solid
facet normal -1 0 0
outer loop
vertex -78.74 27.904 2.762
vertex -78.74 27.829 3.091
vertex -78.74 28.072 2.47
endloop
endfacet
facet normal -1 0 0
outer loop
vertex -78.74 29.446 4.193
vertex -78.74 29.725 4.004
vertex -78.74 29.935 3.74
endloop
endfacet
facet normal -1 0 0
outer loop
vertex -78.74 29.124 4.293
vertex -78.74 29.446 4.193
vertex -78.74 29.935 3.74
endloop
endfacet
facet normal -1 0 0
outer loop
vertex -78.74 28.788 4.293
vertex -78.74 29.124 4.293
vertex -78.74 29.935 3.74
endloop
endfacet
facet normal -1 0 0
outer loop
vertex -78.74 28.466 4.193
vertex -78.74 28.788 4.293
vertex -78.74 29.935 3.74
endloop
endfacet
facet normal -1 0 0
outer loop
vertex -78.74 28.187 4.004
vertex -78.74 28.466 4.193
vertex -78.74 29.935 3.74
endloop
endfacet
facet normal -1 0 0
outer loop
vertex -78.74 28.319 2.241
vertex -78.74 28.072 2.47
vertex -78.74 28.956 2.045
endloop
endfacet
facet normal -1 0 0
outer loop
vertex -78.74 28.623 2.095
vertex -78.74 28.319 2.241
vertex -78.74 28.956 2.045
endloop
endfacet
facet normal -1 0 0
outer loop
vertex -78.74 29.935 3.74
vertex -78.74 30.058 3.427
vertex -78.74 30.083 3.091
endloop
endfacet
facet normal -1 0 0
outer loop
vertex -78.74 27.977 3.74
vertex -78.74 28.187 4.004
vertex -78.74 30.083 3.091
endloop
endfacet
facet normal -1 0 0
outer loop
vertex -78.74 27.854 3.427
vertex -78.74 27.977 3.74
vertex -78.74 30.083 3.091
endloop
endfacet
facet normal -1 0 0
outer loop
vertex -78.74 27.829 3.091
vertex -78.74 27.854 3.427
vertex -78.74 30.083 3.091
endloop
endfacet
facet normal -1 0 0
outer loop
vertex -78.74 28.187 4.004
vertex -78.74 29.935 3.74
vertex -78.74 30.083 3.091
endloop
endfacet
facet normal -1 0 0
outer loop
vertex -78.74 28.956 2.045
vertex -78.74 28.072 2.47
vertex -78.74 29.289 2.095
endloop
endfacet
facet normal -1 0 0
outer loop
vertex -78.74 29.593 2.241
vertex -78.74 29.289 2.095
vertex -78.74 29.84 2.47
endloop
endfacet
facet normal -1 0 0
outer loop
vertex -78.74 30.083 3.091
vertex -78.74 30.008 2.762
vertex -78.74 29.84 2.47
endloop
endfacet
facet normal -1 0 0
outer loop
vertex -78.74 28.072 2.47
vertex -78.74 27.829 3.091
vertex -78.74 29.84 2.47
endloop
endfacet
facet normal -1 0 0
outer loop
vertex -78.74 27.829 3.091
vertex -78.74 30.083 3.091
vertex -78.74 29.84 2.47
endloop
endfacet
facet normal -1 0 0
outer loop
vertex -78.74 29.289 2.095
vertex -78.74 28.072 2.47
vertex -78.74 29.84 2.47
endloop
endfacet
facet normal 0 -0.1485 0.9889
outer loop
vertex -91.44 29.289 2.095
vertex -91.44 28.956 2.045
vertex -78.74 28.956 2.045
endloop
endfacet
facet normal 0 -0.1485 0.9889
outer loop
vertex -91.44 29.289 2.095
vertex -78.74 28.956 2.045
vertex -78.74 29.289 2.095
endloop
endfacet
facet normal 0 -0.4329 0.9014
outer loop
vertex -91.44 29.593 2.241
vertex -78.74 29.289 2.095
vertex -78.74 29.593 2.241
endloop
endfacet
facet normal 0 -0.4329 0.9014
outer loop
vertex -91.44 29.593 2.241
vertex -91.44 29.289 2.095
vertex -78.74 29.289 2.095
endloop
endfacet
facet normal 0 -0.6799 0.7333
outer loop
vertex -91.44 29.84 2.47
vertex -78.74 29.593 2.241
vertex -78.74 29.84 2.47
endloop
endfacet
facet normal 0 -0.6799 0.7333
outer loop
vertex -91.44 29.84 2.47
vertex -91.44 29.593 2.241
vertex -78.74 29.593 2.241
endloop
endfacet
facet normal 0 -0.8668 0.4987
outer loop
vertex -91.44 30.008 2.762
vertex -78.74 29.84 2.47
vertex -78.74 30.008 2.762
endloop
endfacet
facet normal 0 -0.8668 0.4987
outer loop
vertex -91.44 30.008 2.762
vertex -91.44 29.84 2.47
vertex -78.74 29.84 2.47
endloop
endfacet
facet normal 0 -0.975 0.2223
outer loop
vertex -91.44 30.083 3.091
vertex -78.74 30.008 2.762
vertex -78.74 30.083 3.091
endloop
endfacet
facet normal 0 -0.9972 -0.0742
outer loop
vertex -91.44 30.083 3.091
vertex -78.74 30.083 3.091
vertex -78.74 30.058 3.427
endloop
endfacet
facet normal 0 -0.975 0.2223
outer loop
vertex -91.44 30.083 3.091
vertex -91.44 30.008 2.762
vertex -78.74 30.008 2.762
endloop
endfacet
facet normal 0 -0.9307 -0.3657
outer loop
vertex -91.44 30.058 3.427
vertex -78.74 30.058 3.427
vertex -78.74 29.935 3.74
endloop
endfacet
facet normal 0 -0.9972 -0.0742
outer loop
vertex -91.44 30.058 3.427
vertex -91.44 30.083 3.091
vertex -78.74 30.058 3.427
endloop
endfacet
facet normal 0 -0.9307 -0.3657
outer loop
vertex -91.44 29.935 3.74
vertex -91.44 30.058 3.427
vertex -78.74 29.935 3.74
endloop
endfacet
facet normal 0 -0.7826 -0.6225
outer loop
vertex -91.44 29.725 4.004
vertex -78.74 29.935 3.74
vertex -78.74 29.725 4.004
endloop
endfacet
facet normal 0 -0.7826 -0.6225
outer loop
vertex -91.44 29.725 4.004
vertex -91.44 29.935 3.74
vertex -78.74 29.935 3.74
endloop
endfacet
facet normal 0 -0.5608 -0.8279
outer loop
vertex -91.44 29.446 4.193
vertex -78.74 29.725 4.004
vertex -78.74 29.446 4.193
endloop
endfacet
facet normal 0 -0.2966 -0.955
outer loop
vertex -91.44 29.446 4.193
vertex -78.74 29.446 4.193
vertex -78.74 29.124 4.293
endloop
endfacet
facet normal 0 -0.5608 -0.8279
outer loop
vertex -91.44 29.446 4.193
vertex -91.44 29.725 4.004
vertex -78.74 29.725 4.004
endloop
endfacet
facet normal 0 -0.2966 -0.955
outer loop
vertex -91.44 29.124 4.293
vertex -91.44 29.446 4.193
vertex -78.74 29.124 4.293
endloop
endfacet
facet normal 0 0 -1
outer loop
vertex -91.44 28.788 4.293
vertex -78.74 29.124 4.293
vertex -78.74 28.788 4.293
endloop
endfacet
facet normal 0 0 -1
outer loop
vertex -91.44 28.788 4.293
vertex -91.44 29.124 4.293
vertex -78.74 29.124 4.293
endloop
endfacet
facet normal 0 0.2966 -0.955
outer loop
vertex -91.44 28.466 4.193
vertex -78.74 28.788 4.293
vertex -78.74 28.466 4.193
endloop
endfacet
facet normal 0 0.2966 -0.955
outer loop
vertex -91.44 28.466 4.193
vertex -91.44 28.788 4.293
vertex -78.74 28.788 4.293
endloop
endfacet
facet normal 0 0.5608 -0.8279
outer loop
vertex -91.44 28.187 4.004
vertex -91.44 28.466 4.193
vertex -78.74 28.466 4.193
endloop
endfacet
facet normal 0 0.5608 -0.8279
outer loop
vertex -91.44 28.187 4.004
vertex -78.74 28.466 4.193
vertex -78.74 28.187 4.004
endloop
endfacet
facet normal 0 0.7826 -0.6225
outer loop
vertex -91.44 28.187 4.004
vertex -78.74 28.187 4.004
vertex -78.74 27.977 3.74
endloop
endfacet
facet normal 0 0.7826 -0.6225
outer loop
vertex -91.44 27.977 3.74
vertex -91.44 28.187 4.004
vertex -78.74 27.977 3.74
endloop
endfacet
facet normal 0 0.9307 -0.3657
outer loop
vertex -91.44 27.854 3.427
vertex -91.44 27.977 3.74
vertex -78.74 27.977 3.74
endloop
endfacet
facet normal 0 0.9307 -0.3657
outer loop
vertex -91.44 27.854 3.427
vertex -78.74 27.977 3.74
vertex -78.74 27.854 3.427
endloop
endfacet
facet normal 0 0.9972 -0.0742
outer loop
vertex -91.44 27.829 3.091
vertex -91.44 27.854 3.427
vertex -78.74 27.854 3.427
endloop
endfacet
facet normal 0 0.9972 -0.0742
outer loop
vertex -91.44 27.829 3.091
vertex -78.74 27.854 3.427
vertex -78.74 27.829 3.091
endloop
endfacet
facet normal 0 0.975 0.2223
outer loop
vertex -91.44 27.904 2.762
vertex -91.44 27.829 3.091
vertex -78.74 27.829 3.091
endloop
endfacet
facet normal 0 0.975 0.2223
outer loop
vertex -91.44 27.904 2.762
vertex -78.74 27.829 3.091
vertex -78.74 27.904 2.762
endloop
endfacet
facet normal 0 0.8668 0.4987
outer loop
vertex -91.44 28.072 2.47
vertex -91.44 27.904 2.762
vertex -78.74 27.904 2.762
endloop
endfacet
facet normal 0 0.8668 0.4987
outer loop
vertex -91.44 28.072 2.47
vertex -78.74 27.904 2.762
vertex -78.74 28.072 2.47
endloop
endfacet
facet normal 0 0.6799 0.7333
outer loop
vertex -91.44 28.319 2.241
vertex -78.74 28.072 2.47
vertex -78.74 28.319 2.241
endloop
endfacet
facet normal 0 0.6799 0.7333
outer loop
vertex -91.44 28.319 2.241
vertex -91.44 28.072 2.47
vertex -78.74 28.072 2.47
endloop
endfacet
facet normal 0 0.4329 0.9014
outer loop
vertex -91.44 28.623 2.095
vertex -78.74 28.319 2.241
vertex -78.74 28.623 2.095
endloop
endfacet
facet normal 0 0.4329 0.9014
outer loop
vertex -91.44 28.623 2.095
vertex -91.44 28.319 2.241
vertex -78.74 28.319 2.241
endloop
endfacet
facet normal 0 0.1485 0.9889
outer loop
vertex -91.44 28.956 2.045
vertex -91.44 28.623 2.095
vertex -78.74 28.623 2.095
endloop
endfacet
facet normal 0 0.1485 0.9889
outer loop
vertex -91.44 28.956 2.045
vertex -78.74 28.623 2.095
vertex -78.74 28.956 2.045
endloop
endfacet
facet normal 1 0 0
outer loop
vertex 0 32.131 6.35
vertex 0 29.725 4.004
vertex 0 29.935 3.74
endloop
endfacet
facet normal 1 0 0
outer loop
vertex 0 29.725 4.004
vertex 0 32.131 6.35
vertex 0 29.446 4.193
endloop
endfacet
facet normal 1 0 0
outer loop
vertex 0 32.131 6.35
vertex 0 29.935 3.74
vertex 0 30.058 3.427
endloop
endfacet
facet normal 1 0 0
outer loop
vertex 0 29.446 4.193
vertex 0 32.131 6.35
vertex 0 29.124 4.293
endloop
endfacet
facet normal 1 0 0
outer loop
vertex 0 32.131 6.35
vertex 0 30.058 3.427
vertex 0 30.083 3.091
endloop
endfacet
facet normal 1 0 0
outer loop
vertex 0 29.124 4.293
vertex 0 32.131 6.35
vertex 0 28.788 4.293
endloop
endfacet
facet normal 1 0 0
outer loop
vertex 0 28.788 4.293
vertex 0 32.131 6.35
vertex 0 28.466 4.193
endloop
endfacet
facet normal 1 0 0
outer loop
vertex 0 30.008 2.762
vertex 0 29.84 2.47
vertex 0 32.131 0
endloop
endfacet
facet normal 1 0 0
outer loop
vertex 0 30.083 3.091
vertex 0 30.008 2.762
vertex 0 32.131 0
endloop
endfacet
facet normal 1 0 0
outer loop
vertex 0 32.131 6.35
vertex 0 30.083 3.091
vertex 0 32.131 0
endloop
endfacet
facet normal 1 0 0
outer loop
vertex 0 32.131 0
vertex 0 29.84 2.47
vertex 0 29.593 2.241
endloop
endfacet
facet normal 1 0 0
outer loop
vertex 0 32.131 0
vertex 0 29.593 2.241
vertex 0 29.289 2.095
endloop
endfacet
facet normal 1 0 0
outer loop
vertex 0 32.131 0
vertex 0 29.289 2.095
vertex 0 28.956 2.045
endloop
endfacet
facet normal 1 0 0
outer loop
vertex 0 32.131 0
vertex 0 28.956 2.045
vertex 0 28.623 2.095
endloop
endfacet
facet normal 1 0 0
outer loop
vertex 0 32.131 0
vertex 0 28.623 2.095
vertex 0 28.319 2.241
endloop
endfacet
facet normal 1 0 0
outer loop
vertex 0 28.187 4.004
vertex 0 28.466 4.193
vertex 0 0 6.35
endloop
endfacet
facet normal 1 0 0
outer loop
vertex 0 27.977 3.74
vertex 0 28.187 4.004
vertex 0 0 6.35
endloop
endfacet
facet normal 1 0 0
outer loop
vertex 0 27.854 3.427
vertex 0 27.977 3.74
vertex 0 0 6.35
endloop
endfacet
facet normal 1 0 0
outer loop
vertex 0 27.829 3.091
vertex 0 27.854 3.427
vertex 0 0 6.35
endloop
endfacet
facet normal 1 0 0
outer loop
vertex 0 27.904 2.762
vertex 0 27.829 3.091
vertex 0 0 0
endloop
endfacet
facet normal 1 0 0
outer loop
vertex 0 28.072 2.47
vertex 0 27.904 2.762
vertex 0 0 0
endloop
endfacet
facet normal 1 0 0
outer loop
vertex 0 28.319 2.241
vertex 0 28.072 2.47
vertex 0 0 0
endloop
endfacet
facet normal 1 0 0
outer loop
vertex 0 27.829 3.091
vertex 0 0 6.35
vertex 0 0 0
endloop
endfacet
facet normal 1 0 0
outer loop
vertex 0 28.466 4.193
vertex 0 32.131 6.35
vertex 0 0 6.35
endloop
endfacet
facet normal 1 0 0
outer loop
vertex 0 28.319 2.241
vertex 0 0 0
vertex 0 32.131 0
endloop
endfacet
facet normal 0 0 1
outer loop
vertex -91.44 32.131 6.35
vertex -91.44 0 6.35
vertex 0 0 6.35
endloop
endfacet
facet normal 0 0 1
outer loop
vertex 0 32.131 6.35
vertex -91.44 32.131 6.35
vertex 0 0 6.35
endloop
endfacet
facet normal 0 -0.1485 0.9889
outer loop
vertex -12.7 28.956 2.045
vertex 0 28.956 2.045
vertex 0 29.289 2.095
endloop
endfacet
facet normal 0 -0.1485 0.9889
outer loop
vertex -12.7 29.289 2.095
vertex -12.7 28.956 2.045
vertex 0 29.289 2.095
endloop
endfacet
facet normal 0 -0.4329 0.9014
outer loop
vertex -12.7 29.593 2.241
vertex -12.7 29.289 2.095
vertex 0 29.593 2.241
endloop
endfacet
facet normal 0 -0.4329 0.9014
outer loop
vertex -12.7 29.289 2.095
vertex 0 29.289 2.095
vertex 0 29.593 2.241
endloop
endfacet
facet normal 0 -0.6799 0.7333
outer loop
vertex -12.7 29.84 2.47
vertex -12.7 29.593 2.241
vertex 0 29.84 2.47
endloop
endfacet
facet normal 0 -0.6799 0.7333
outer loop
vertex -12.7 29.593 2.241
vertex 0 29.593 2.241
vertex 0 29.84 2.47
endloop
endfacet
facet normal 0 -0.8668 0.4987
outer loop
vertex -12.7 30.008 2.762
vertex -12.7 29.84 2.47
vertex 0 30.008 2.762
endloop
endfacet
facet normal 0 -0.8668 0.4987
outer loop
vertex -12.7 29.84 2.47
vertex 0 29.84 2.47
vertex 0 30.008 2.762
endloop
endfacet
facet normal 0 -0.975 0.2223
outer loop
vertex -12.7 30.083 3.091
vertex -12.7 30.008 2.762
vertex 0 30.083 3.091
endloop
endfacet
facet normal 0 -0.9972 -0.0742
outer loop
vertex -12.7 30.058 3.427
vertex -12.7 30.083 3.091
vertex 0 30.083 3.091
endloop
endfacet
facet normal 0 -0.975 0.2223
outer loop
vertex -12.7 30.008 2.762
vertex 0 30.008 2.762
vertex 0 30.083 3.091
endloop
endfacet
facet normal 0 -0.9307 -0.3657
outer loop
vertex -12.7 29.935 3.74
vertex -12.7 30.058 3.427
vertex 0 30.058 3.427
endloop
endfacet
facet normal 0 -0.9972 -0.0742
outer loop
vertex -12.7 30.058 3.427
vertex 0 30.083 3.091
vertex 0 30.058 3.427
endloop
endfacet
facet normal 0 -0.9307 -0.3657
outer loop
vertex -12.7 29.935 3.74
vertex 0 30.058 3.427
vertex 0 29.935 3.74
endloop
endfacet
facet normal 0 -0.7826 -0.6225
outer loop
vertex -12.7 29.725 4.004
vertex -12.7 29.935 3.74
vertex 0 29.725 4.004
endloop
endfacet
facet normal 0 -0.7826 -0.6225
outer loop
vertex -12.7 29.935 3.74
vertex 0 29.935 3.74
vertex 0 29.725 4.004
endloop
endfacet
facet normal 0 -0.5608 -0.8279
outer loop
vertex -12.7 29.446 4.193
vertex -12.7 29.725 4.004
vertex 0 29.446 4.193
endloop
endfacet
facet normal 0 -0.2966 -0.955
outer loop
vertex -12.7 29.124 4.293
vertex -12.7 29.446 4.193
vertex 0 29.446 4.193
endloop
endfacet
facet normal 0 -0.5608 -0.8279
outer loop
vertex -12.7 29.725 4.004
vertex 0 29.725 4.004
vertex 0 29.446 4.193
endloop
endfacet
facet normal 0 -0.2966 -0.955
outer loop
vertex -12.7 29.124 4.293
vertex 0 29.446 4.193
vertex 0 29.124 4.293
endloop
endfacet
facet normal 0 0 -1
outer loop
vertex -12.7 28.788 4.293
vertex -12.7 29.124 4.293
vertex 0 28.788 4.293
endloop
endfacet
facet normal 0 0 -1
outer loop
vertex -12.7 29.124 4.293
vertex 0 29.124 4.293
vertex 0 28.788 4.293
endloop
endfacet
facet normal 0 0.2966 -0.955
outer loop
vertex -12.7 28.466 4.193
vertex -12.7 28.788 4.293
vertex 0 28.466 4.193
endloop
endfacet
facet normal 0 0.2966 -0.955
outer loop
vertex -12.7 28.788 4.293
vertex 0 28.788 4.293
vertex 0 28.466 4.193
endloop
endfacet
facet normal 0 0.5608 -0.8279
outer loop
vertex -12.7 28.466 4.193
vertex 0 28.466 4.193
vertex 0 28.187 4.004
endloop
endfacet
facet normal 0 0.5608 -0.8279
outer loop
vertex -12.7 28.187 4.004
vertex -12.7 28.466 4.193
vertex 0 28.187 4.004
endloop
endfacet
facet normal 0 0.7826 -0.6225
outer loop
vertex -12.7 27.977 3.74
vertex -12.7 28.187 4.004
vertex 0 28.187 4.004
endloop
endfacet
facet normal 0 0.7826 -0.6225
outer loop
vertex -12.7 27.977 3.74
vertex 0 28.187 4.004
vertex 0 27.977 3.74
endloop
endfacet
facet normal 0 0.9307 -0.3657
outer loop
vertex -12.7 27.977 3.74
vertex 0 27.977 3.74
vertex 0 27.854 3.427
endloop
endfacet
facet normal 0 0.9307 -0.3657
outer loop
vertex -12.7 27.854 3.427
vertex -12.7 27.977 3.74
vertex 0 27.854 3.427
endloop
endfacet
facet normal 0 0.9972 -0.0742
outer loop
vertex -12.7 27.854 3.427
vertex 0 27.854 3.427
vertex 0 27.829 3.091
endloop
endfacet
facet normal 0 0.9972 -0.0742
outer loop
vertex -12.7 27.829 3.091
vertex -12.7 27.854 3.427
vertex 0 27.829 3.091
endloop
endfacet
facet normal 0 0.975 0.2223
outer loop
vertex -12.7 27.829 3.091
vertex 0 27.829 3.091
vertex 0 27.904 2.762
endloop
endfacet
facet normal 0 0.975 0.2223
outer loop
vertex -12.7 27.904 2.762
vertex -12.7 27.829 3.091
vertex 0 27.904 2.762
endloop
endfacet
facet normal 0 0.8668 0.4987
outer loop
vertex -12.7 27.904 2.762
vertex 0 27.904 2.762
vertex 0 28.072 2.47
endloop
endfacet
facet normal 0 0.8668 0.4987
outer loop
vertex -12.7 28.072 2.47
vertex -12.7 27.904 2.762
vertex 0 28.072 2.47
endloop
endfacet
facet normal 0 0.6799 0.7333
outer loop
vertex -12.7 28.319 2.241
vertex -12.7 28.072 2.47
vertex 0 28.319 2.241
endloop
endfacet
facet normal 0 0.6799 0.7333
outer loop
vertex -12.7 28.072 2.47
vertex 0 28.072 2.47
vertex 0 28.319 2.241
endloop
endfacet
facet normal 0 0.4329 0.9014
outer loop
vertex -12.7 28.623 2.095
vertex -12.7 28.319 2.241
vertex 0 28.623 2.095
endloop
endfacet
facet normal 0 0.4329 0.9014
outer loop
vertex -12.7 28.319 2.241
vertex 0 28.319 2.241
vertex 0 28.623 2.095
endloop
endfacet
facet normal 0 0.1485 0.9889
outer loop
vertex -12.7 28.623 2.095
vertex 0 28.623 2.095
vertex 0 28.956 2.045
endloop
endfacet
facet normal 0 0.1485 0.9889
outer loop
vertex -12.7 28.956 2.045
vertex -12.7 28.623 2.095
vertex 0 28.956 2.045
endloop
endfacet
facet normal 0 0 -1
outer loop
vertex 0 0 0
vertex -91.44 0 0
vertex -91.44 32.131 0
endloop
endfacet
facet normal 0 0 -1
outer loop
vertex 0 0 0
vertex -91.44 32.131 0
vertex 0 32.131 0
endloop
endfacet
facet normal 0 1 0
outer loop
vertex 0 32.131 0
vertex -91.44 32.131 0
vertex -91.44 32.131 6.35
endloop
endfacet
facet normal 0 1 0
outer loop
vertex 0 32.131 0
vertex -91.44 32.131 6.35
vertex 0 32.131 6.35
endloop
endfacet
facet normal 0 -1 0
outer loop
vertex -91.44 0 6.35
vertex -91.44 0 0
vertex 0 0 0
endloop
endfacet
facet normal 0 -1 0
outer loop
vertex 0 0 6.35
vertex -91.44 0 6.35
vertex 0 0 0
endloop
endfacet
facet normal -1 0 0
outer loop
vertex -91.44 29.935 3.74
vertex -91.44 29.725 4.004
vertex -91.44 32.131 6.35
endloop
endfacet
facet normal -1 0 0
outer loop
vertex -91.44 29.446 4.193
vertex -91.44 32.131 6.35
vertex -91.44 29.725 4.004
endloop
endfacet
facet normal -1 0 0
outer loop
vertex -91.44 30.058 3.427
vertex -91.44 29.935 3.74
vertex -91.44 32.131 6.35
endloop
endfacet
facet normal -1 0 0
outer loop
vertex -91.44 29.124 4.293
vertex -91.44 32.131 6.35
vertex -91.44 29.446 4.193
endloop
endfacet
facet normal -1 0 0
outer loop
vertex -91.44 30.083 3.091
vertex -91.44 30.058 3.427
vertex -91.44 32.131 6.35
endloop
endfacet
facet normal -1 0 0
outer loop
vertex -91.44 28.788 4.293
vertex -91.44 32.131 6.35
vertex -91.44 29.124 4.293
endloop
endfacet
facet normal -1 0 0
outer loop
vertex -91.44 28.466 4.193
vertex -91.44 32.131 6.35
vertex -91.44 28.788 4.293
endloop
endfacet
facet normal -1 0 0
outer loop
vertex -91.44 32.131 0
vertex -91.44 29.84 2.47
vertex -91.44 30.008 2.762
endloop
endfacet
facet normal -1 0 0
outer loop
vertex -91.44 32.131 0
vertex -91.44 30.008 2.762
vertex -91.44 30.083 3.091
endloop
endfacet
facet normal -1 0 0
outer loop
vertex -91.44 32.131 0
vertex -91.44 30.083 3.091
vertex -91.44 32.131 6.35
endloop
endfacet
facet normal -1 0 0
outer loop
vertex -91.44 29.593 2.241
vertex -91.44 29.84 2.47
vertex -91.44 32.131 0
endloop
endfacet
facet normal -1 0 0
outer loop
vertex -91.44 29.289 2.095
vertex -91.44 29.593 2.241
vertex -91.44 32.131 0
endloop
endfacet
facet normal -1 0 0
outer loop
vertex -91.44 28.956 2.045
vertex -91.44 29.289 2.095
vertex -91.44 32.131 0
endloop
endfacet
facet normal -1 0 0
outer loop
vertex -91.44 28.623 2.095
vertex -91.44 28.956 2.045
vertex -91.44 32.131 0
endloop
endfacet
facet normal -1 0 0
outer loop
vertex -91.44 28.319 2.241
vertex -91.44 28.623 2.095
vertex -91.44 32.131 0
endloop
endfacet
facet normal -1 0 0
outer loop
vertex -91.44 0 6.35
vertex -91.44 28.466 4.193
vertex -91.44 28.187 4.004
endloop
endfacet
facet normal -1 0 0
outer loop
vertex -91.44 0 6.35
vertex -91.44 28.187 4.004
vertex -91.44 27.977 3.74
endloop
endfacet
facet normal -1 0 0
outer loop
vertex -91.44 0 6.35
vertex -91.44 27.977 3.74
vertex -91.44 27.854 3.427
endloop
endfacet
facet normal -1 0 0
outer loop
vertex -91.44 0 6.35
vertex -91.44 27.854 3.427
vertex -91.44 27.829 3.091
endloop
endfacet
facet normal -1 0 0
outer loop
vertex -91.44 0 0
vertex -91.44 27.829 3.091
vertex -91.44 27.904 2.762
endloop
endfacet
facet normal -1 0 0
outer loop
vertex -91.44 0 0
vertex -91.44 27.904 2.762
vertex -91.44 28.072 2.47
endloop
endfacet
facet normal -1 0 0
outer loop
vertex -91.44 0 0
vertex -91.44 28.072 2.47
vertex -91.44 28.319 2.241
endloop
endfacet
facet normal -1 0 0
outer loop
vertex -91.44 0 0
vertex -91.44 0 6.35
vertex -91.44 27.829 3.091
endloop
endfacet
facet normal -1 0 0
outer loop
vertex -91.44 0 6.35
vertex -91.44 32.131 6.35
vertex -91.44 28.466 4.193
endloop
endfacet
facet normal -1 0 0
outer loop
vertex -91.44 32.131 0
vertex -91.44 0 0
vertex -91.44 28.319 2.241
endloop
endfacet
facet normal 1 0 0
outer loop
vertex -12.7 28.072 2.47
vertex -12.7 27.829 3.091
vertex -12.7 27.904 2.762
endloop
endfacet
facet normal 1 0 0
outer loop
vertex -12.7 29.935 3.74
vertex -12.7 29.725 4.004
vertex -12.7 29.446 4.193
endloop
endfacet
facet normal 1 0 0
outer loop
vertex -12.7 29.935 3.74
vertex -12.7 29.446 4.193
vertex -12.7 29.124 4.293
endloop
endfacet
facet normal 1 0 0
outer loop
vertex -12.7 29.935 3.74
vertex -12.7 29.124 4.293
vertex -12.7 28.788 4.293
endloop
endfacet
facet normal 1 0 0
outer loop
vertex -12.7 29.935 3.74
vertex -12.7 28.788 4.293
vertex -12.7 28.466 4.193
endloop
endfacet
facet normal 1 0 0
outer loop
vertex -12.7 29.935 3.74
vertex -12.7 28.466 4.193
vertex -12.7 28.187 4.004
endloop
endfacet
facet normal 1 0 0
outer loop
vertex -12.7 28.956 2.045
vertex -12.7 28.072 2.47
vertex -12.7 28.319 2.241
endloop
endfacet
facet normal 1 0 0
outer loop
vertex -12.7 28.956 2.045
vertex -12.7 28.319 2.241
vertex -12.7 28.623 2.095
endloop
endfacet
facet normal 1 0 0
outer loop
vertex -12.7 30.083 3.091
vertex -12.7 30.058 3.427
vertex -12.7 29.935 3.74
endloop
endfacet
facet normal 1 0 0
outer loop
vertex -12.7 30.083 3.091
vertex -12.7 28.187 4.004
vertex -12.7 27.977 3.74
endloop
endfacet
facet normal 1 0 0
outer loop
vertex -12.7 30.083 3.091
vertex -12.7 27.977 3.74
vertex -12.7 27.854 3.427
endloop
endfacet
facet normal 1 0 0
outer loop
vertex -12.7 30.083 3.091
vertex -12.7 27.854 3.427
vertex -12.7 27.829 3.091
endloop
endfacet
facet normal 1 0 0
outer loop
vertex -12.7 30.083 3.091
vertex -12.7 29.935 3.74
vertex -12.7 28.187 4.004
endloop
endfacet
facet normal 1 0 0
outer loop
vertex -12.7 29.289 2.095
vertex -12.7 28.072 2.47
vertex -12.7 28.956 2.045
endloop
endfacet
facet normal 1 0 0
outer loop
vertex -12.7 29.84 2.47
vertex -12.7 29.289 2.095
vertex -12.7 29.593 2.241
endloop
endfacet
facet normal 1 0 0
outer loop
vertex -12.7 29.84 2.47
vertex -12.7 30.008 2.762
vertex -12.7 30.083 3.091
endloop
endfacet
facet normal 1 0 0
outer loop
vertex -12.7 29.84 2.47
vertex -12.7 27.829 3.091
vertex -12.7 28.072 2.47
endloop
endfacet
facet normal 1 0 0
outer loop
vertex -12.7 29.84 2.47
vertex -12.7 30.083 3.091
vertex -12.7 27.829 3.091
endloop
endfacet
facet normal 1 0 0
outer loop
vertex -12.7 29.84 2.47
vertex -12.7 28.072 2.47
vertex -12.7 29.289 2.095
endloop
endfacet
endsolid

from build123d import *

# Parameters (mm, degrees)
SKETCH1_W           = 91.44
SKETCH1_H           = 6.35
BOSS_EXTRUDE1_DEPTH = 32.131
SKETCH2_R           = 1.1303
CUT_EXTRUDE1_DEPTH  = 12.7


with BuildPart() as part:
    # Sketch1 → Boss-Extrude1 (new body)
    with BuildSketch(Plane(origin=(0, 0, 0), x_dir=(1, 0, 0), z_dir=(0, 1, 0))):
        with Locations((-45.72, -3.175)):
            Rectangle(SKETCH1_W, SKETCH1_H)
    extrude(amount=BOSS_EXTRUDE1_DEPTH)

    # Sketch2 → Cut-Extrude1 (cut)
    with BuildSketch(Plane(origin=(0, 0, 0), x_dir=(0, 0, -1), z_dir=(1, 0, 0))):
        with Locations((-3.175, 28.956)):
            Circle(SKETCH2_R)
    cut_extrude1 = extrude(amount=-CUT_EXTRUDE1_DEPTH, mode=Mode.SUBTRACT)

    # Mirror1: Cut-Extrude1 across plane
    add(cut_extrude1.mirror(Plane(origin=(-45.72, 0, 0), x_dir=(0, 0, 1), z_dir=(1, 0, 0))), mode=Mode.SUBTRACT)


solid = part.part
